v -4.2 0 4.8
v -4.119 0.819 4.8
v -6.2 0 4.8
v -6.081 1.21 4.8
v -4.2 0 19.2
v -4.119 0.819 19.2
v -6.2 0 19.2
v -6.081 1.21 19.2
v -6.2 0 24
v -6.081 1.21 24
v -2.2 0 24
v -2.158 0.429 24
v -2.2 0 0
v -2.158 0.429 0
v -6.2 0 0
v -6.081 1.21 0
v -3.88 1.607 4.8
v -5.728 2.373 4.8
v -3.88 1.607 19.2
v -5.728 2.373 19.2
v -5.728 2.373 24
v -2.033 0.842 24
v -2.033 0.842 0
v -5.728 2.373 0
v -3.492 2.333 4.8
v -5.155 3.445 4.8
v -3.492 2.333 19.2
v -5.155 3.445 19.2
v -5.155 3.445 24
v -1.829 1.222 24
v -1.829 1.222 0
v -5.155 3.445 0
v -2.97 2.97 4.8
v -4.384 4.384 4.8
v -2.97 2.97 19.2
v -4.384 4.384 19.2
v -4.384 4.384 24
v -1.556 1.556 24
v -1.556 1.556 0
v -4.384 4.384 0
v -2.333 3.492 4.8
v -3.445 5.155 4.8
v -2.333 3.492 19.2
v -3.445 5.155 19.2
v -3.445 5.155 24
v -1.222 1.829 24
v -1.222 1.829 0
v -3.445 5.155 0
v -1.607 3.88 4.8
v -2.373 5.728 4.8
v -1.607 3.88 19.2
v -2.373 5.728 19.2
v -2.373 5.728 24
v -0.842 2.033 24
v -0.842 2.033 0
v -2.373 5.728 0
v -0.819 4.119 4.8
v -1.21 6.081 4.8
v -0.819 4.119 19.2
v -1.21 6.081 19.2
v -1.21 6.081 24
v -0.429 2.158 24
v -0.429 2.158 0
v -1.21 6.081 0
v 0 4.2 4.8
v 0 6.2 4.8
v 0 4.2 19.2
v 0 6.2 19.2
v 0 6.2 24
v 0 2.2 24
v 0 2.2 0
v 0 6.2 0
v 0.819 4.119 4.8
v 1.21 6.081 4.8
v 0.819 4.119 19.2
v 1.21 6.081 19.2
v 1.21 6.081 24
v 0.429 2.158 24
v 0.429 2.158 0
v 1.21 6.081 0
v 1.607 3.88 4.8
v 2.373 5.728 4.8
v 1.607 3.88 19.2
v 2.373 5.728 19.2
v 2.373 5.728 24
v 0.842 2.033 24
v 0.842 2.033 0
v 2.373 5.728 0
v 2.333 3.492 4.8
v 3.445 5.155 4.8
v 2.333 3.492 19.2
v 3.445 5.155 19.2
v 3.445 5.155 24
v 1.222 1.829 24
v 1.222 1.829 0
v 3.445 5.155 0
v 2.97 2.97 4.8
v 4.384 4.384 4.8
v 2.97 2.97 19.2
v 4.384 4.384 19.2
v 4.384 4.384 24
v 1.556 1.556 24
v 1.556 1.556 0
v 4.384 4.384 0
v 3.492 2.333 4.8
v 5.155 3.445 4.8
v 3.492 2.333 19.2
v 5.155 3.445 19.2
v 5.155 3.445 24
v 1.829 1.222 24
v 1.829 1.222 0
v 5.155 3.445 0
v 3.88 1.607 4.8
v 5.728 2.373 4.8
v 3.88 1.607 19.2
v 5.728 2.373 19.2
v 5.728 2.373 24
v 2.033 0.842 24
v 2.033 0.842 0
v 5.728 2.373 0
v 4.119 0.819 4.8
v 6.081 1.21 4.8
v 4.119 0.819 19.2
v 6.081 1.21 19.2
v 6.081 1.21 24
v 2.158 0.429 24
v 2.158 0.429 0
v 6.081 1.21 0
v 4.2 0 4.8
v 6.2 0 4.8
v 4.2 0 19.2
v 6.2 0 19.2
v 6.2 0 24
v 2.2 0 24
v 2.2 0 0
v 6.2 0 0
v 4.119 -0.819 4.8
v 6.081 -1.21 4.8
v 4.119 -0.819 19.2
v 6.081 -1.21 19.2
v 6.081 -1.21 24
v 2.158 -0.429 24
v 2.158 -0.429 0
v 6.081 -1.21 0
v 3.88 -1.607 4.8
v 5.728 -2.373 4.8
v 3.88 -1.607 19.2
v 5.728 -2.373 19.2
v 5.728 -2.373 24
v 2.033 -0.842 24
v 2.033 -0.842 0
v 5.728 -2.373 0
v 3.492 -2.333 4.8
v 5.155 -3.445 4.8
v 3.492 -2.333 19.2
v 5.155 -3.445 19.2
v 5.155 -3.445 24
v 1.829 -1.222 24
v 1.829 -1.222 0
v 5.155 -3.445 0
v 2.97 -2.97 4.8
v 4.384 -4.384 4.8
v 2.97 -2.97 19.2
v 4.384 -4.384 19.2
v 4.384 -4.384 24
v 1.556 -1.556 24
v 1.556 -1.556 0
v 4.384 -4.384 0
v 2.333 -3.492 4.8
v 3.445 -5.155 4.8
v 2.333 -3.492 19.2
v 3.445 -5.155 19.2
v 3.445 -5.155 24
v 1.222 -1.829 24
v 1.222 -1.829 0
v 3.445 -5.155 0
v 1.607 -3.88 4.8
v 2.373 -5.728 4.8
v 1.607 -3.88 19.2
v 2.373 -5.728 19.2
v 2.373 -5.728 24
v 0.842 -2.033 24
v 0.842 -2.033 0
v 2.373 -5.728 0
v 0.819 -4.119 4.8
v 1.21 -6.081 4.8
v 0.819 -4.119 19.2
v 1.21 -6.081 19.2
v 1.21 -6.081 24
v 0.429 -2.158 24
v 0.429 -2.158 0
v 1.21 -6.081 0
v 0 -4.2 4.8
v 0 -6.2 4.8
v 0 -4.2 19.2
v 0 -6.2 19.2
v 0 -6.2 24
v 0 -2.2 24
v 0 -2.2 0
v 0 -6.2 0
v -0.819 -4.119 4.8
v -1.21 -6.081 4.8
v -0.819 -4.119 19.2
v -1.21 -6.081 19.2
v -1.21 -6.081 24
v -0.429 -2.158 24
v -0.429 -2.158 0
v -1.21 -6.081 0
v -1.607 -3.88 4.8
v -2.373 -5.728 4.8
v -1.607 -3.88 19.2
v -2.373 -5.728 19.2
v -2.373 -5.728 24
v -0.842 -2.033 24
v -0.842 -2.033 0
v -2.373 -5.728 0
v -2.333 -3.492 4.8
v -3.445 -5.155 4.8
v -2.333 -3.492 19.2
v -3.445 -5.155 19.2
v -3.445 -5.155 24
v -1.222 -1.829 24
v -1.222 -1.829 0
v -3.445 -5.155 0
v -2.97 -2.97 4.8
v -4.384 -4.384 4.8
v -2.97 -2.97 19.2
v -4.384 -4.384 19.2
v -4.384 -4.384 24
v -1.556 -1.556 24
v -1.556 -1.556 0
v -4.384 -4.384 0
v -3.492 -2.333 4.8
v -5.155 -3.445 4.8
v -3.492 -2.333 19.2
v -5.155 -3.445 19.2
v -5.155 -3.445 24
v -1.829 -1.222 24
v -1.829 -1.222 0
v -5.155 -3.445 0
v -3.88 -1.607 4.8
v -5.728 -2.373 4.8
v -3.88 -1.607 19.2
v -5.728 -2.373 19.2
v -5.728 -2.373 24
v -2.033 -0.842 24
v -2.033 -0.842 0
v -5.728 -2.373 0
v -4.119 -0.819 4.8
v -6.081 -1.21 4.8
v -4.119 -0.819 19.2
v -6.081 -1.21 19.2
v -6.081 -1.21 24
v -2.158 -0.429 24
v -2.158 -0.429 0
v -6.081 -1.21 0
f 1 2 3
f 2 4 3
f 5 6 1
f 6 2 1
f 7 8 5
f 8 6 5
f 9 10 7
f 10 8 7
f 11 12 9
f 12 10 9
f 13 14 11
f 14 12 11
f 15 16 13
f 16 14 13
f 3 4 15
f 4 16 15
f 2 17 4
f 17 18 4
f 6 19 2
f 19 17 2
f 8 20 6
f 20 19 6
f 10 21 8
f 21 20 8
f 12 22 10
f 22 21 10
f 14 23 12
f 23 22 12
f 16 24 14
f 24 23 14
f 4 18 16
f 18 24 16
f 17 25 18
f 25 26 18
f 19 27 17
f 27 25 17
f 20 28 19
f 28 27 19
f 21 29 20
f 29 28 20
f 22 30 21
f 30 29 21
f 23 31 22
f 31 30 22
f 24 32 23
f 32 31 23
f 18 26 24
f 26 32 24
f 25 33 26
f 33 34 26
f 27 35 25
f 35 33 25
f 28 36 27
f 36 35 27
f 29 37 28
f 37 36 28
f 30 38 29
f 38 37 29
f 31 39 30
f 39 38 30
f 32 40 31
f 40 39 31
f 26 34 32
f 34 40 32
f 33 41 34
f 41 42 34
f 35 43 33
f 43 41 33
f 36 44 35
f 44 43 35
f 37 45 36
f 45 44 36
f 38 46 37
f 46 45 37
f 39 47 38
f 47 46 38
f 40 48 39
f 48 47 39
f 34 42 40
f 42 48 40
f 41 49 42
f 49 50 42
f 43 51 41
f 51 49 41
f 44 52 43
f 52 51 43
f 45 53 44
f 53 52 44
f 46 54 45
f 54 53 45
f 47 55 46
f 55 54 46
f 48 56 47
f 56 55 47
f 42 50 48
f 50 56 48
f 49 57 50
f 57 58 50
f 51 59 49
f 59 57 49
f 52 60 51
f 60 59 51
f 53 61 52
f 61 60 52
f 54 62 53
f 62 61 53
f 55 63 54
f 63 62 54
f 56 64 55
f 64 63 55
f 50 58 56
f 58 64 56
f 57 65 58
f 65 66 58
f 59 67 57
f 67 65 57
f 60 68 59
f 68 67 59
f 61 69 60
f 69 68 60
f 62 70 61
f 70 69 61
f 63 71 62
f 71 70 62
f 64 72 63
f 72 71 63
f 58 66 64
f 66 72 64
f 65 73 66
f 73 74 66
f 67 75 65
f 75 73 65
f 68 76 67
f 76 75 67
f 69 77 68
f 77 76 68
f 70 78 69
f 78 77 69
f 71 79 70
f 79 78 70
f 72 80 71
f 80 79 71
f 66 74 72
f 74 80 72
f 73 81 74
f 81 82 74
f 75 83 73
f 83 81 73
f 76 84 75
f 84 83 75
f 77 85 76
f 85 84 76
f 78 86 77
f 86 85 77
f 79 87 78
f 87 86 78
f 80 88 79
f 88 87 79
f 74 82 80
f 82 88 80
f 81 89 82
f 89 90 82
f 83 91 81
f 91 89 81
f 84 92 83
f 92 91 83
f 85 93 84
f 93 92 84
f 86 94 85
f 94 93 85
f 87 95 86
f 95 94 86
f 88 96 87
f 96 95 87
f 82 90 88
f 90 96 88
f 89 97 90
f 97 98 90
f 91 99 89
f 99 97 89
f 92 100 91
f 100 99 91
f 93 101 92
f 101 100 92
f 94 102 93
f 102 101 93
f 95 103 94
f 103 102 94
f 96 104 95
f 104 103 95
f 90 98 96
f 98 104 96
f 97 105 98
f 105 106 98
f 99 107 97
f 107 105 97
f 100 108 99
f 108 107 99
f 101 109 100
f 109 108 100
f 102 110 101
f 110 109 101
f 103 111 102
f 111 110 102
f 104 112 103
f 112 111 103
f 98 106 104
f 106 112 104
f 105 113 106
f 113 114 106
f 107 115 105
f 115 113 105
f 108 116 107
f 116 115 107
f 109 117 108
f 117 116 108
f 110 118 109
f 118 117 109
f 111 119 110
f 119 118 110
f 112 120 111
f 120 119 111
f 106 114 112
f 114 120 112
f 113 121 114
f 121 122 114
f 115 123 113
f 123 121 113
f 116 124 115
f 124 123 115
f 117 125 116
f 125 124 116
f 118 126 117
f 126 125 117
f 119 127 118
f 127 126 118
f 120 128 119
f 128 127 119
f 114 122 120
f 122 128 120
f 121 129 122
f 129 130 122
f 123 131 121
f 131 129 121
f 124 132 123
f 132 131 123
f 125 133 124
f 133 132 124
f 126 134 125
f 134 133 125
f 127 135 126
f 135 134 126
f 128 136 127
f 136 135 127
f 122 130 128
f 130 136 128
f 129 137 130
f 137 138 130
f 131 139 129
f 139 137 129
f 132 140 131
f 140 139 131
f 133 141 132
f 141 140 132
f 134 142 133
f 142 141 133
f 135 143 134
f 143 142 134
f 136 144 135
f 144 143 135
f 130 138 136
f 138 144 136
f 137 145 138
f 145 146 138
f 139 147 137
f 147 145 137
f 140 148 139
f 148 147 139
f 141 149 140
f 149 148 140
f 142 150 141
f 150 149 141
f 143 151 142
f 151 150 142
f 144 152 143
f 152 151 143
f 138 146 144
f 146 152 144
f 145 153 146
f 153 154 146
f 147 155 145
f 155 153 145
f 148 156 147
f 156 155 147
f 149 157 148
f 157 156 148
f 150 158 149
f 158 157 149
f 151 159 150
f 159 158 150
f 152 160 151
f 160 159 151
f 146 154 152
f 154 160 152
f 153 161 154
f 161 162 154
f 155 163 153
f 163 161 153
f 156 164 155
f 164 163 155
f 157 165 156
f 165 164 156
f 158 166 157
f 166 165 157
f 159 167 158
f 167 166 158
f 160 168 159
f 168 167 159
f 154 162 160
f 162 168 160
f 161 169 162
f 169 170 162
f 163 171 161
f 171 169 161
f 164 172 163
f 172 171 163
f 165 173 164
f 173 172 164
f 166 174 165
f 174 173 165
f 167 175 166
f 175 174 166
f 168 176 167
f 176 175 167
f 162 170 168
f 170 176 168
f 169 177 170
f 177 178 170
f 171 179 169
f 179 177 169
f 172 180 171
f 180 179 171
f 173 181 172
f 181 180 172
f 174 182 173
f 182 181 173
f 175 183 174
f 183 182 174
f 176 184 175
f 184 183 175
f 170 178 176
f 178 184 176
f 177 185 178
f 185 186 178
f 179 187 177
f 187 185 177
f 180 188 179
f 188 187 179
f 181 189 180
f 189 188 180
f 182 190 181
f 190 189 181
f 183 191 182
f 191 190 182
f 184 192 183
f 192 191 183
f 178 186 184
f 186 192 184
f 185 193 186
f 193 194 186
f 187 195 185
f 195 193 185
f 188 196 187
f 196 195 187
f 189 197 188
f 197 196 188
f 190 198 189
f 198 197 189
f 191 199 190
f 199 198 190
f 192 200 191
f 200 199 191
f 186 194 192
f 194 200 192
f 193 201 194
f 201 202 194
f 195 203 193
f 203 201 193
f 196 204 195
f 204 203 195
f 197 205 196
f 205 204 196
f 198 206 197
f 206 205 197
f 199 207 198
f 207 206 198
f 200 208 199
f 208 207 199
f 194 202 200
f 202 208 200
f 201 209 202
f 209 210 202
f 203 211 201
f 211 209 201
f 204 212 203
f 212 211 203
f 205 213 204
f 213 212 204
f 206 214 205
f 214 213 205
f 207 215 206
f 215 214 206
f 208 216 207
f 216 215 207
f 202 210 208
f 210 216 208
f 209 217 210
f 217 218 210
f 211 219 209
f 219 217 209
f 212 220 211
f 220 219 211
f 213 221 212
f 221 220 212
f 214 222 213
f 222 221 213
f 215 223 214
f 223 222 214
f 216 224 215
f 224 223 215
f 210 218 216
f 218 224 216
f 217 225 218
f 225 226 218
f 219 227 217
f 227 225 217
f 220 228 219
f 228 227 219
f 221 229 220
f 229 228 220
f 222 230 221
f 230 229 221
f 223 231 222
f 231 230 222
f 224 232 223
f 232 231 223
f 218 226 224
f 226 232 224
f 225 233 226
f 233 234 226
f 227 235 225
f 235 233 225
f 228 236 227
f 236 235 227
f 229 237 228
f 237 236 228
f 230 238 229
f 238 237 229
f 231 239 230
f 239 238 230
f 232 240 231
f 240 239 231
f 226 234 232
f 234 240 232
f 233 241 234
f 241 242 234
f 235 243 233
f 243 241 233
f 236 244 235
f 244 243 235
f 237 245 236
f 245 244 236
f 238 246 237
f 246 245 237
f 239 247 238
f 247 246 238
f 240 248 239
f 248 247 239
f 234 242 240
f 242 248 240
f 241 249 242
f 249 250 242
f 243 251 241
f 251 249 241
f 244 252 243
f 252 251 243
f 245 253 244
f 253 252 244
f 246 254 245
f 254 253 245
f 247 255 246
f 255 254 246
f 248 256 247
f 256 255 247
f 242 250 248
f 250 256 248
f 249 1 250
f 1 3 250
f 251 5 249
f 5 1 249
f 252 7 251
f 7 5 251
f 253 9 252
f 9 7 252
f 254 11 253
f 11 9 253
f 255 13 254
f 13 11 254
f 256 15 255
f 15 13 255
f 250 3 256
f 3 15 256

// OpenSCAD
$fn = 32;

// ----------------------------------------------------------------------
// Profiled standoff: spool spacer, 24 mm long, bore 4.4 mm
// ----------------------------------------------------------------------

// --- parameters (mm) ---
revolve_angle = 360;      // full turn around the Z axis
profile_points = 8;       // points of the closed outline

profile = [[2.2, 0], [6.2, 0], [6.2, 4.8], [4.2, 4.8], [4.2, 19.2], [6.2, 19.2], [6.2, 24], [2.2, 24]];  // single closed polygon, 8 points, counter clockwise

// --- the one profile operation ---
rotate_extrude(angle = revolve_angle) polygon(points = profile);
